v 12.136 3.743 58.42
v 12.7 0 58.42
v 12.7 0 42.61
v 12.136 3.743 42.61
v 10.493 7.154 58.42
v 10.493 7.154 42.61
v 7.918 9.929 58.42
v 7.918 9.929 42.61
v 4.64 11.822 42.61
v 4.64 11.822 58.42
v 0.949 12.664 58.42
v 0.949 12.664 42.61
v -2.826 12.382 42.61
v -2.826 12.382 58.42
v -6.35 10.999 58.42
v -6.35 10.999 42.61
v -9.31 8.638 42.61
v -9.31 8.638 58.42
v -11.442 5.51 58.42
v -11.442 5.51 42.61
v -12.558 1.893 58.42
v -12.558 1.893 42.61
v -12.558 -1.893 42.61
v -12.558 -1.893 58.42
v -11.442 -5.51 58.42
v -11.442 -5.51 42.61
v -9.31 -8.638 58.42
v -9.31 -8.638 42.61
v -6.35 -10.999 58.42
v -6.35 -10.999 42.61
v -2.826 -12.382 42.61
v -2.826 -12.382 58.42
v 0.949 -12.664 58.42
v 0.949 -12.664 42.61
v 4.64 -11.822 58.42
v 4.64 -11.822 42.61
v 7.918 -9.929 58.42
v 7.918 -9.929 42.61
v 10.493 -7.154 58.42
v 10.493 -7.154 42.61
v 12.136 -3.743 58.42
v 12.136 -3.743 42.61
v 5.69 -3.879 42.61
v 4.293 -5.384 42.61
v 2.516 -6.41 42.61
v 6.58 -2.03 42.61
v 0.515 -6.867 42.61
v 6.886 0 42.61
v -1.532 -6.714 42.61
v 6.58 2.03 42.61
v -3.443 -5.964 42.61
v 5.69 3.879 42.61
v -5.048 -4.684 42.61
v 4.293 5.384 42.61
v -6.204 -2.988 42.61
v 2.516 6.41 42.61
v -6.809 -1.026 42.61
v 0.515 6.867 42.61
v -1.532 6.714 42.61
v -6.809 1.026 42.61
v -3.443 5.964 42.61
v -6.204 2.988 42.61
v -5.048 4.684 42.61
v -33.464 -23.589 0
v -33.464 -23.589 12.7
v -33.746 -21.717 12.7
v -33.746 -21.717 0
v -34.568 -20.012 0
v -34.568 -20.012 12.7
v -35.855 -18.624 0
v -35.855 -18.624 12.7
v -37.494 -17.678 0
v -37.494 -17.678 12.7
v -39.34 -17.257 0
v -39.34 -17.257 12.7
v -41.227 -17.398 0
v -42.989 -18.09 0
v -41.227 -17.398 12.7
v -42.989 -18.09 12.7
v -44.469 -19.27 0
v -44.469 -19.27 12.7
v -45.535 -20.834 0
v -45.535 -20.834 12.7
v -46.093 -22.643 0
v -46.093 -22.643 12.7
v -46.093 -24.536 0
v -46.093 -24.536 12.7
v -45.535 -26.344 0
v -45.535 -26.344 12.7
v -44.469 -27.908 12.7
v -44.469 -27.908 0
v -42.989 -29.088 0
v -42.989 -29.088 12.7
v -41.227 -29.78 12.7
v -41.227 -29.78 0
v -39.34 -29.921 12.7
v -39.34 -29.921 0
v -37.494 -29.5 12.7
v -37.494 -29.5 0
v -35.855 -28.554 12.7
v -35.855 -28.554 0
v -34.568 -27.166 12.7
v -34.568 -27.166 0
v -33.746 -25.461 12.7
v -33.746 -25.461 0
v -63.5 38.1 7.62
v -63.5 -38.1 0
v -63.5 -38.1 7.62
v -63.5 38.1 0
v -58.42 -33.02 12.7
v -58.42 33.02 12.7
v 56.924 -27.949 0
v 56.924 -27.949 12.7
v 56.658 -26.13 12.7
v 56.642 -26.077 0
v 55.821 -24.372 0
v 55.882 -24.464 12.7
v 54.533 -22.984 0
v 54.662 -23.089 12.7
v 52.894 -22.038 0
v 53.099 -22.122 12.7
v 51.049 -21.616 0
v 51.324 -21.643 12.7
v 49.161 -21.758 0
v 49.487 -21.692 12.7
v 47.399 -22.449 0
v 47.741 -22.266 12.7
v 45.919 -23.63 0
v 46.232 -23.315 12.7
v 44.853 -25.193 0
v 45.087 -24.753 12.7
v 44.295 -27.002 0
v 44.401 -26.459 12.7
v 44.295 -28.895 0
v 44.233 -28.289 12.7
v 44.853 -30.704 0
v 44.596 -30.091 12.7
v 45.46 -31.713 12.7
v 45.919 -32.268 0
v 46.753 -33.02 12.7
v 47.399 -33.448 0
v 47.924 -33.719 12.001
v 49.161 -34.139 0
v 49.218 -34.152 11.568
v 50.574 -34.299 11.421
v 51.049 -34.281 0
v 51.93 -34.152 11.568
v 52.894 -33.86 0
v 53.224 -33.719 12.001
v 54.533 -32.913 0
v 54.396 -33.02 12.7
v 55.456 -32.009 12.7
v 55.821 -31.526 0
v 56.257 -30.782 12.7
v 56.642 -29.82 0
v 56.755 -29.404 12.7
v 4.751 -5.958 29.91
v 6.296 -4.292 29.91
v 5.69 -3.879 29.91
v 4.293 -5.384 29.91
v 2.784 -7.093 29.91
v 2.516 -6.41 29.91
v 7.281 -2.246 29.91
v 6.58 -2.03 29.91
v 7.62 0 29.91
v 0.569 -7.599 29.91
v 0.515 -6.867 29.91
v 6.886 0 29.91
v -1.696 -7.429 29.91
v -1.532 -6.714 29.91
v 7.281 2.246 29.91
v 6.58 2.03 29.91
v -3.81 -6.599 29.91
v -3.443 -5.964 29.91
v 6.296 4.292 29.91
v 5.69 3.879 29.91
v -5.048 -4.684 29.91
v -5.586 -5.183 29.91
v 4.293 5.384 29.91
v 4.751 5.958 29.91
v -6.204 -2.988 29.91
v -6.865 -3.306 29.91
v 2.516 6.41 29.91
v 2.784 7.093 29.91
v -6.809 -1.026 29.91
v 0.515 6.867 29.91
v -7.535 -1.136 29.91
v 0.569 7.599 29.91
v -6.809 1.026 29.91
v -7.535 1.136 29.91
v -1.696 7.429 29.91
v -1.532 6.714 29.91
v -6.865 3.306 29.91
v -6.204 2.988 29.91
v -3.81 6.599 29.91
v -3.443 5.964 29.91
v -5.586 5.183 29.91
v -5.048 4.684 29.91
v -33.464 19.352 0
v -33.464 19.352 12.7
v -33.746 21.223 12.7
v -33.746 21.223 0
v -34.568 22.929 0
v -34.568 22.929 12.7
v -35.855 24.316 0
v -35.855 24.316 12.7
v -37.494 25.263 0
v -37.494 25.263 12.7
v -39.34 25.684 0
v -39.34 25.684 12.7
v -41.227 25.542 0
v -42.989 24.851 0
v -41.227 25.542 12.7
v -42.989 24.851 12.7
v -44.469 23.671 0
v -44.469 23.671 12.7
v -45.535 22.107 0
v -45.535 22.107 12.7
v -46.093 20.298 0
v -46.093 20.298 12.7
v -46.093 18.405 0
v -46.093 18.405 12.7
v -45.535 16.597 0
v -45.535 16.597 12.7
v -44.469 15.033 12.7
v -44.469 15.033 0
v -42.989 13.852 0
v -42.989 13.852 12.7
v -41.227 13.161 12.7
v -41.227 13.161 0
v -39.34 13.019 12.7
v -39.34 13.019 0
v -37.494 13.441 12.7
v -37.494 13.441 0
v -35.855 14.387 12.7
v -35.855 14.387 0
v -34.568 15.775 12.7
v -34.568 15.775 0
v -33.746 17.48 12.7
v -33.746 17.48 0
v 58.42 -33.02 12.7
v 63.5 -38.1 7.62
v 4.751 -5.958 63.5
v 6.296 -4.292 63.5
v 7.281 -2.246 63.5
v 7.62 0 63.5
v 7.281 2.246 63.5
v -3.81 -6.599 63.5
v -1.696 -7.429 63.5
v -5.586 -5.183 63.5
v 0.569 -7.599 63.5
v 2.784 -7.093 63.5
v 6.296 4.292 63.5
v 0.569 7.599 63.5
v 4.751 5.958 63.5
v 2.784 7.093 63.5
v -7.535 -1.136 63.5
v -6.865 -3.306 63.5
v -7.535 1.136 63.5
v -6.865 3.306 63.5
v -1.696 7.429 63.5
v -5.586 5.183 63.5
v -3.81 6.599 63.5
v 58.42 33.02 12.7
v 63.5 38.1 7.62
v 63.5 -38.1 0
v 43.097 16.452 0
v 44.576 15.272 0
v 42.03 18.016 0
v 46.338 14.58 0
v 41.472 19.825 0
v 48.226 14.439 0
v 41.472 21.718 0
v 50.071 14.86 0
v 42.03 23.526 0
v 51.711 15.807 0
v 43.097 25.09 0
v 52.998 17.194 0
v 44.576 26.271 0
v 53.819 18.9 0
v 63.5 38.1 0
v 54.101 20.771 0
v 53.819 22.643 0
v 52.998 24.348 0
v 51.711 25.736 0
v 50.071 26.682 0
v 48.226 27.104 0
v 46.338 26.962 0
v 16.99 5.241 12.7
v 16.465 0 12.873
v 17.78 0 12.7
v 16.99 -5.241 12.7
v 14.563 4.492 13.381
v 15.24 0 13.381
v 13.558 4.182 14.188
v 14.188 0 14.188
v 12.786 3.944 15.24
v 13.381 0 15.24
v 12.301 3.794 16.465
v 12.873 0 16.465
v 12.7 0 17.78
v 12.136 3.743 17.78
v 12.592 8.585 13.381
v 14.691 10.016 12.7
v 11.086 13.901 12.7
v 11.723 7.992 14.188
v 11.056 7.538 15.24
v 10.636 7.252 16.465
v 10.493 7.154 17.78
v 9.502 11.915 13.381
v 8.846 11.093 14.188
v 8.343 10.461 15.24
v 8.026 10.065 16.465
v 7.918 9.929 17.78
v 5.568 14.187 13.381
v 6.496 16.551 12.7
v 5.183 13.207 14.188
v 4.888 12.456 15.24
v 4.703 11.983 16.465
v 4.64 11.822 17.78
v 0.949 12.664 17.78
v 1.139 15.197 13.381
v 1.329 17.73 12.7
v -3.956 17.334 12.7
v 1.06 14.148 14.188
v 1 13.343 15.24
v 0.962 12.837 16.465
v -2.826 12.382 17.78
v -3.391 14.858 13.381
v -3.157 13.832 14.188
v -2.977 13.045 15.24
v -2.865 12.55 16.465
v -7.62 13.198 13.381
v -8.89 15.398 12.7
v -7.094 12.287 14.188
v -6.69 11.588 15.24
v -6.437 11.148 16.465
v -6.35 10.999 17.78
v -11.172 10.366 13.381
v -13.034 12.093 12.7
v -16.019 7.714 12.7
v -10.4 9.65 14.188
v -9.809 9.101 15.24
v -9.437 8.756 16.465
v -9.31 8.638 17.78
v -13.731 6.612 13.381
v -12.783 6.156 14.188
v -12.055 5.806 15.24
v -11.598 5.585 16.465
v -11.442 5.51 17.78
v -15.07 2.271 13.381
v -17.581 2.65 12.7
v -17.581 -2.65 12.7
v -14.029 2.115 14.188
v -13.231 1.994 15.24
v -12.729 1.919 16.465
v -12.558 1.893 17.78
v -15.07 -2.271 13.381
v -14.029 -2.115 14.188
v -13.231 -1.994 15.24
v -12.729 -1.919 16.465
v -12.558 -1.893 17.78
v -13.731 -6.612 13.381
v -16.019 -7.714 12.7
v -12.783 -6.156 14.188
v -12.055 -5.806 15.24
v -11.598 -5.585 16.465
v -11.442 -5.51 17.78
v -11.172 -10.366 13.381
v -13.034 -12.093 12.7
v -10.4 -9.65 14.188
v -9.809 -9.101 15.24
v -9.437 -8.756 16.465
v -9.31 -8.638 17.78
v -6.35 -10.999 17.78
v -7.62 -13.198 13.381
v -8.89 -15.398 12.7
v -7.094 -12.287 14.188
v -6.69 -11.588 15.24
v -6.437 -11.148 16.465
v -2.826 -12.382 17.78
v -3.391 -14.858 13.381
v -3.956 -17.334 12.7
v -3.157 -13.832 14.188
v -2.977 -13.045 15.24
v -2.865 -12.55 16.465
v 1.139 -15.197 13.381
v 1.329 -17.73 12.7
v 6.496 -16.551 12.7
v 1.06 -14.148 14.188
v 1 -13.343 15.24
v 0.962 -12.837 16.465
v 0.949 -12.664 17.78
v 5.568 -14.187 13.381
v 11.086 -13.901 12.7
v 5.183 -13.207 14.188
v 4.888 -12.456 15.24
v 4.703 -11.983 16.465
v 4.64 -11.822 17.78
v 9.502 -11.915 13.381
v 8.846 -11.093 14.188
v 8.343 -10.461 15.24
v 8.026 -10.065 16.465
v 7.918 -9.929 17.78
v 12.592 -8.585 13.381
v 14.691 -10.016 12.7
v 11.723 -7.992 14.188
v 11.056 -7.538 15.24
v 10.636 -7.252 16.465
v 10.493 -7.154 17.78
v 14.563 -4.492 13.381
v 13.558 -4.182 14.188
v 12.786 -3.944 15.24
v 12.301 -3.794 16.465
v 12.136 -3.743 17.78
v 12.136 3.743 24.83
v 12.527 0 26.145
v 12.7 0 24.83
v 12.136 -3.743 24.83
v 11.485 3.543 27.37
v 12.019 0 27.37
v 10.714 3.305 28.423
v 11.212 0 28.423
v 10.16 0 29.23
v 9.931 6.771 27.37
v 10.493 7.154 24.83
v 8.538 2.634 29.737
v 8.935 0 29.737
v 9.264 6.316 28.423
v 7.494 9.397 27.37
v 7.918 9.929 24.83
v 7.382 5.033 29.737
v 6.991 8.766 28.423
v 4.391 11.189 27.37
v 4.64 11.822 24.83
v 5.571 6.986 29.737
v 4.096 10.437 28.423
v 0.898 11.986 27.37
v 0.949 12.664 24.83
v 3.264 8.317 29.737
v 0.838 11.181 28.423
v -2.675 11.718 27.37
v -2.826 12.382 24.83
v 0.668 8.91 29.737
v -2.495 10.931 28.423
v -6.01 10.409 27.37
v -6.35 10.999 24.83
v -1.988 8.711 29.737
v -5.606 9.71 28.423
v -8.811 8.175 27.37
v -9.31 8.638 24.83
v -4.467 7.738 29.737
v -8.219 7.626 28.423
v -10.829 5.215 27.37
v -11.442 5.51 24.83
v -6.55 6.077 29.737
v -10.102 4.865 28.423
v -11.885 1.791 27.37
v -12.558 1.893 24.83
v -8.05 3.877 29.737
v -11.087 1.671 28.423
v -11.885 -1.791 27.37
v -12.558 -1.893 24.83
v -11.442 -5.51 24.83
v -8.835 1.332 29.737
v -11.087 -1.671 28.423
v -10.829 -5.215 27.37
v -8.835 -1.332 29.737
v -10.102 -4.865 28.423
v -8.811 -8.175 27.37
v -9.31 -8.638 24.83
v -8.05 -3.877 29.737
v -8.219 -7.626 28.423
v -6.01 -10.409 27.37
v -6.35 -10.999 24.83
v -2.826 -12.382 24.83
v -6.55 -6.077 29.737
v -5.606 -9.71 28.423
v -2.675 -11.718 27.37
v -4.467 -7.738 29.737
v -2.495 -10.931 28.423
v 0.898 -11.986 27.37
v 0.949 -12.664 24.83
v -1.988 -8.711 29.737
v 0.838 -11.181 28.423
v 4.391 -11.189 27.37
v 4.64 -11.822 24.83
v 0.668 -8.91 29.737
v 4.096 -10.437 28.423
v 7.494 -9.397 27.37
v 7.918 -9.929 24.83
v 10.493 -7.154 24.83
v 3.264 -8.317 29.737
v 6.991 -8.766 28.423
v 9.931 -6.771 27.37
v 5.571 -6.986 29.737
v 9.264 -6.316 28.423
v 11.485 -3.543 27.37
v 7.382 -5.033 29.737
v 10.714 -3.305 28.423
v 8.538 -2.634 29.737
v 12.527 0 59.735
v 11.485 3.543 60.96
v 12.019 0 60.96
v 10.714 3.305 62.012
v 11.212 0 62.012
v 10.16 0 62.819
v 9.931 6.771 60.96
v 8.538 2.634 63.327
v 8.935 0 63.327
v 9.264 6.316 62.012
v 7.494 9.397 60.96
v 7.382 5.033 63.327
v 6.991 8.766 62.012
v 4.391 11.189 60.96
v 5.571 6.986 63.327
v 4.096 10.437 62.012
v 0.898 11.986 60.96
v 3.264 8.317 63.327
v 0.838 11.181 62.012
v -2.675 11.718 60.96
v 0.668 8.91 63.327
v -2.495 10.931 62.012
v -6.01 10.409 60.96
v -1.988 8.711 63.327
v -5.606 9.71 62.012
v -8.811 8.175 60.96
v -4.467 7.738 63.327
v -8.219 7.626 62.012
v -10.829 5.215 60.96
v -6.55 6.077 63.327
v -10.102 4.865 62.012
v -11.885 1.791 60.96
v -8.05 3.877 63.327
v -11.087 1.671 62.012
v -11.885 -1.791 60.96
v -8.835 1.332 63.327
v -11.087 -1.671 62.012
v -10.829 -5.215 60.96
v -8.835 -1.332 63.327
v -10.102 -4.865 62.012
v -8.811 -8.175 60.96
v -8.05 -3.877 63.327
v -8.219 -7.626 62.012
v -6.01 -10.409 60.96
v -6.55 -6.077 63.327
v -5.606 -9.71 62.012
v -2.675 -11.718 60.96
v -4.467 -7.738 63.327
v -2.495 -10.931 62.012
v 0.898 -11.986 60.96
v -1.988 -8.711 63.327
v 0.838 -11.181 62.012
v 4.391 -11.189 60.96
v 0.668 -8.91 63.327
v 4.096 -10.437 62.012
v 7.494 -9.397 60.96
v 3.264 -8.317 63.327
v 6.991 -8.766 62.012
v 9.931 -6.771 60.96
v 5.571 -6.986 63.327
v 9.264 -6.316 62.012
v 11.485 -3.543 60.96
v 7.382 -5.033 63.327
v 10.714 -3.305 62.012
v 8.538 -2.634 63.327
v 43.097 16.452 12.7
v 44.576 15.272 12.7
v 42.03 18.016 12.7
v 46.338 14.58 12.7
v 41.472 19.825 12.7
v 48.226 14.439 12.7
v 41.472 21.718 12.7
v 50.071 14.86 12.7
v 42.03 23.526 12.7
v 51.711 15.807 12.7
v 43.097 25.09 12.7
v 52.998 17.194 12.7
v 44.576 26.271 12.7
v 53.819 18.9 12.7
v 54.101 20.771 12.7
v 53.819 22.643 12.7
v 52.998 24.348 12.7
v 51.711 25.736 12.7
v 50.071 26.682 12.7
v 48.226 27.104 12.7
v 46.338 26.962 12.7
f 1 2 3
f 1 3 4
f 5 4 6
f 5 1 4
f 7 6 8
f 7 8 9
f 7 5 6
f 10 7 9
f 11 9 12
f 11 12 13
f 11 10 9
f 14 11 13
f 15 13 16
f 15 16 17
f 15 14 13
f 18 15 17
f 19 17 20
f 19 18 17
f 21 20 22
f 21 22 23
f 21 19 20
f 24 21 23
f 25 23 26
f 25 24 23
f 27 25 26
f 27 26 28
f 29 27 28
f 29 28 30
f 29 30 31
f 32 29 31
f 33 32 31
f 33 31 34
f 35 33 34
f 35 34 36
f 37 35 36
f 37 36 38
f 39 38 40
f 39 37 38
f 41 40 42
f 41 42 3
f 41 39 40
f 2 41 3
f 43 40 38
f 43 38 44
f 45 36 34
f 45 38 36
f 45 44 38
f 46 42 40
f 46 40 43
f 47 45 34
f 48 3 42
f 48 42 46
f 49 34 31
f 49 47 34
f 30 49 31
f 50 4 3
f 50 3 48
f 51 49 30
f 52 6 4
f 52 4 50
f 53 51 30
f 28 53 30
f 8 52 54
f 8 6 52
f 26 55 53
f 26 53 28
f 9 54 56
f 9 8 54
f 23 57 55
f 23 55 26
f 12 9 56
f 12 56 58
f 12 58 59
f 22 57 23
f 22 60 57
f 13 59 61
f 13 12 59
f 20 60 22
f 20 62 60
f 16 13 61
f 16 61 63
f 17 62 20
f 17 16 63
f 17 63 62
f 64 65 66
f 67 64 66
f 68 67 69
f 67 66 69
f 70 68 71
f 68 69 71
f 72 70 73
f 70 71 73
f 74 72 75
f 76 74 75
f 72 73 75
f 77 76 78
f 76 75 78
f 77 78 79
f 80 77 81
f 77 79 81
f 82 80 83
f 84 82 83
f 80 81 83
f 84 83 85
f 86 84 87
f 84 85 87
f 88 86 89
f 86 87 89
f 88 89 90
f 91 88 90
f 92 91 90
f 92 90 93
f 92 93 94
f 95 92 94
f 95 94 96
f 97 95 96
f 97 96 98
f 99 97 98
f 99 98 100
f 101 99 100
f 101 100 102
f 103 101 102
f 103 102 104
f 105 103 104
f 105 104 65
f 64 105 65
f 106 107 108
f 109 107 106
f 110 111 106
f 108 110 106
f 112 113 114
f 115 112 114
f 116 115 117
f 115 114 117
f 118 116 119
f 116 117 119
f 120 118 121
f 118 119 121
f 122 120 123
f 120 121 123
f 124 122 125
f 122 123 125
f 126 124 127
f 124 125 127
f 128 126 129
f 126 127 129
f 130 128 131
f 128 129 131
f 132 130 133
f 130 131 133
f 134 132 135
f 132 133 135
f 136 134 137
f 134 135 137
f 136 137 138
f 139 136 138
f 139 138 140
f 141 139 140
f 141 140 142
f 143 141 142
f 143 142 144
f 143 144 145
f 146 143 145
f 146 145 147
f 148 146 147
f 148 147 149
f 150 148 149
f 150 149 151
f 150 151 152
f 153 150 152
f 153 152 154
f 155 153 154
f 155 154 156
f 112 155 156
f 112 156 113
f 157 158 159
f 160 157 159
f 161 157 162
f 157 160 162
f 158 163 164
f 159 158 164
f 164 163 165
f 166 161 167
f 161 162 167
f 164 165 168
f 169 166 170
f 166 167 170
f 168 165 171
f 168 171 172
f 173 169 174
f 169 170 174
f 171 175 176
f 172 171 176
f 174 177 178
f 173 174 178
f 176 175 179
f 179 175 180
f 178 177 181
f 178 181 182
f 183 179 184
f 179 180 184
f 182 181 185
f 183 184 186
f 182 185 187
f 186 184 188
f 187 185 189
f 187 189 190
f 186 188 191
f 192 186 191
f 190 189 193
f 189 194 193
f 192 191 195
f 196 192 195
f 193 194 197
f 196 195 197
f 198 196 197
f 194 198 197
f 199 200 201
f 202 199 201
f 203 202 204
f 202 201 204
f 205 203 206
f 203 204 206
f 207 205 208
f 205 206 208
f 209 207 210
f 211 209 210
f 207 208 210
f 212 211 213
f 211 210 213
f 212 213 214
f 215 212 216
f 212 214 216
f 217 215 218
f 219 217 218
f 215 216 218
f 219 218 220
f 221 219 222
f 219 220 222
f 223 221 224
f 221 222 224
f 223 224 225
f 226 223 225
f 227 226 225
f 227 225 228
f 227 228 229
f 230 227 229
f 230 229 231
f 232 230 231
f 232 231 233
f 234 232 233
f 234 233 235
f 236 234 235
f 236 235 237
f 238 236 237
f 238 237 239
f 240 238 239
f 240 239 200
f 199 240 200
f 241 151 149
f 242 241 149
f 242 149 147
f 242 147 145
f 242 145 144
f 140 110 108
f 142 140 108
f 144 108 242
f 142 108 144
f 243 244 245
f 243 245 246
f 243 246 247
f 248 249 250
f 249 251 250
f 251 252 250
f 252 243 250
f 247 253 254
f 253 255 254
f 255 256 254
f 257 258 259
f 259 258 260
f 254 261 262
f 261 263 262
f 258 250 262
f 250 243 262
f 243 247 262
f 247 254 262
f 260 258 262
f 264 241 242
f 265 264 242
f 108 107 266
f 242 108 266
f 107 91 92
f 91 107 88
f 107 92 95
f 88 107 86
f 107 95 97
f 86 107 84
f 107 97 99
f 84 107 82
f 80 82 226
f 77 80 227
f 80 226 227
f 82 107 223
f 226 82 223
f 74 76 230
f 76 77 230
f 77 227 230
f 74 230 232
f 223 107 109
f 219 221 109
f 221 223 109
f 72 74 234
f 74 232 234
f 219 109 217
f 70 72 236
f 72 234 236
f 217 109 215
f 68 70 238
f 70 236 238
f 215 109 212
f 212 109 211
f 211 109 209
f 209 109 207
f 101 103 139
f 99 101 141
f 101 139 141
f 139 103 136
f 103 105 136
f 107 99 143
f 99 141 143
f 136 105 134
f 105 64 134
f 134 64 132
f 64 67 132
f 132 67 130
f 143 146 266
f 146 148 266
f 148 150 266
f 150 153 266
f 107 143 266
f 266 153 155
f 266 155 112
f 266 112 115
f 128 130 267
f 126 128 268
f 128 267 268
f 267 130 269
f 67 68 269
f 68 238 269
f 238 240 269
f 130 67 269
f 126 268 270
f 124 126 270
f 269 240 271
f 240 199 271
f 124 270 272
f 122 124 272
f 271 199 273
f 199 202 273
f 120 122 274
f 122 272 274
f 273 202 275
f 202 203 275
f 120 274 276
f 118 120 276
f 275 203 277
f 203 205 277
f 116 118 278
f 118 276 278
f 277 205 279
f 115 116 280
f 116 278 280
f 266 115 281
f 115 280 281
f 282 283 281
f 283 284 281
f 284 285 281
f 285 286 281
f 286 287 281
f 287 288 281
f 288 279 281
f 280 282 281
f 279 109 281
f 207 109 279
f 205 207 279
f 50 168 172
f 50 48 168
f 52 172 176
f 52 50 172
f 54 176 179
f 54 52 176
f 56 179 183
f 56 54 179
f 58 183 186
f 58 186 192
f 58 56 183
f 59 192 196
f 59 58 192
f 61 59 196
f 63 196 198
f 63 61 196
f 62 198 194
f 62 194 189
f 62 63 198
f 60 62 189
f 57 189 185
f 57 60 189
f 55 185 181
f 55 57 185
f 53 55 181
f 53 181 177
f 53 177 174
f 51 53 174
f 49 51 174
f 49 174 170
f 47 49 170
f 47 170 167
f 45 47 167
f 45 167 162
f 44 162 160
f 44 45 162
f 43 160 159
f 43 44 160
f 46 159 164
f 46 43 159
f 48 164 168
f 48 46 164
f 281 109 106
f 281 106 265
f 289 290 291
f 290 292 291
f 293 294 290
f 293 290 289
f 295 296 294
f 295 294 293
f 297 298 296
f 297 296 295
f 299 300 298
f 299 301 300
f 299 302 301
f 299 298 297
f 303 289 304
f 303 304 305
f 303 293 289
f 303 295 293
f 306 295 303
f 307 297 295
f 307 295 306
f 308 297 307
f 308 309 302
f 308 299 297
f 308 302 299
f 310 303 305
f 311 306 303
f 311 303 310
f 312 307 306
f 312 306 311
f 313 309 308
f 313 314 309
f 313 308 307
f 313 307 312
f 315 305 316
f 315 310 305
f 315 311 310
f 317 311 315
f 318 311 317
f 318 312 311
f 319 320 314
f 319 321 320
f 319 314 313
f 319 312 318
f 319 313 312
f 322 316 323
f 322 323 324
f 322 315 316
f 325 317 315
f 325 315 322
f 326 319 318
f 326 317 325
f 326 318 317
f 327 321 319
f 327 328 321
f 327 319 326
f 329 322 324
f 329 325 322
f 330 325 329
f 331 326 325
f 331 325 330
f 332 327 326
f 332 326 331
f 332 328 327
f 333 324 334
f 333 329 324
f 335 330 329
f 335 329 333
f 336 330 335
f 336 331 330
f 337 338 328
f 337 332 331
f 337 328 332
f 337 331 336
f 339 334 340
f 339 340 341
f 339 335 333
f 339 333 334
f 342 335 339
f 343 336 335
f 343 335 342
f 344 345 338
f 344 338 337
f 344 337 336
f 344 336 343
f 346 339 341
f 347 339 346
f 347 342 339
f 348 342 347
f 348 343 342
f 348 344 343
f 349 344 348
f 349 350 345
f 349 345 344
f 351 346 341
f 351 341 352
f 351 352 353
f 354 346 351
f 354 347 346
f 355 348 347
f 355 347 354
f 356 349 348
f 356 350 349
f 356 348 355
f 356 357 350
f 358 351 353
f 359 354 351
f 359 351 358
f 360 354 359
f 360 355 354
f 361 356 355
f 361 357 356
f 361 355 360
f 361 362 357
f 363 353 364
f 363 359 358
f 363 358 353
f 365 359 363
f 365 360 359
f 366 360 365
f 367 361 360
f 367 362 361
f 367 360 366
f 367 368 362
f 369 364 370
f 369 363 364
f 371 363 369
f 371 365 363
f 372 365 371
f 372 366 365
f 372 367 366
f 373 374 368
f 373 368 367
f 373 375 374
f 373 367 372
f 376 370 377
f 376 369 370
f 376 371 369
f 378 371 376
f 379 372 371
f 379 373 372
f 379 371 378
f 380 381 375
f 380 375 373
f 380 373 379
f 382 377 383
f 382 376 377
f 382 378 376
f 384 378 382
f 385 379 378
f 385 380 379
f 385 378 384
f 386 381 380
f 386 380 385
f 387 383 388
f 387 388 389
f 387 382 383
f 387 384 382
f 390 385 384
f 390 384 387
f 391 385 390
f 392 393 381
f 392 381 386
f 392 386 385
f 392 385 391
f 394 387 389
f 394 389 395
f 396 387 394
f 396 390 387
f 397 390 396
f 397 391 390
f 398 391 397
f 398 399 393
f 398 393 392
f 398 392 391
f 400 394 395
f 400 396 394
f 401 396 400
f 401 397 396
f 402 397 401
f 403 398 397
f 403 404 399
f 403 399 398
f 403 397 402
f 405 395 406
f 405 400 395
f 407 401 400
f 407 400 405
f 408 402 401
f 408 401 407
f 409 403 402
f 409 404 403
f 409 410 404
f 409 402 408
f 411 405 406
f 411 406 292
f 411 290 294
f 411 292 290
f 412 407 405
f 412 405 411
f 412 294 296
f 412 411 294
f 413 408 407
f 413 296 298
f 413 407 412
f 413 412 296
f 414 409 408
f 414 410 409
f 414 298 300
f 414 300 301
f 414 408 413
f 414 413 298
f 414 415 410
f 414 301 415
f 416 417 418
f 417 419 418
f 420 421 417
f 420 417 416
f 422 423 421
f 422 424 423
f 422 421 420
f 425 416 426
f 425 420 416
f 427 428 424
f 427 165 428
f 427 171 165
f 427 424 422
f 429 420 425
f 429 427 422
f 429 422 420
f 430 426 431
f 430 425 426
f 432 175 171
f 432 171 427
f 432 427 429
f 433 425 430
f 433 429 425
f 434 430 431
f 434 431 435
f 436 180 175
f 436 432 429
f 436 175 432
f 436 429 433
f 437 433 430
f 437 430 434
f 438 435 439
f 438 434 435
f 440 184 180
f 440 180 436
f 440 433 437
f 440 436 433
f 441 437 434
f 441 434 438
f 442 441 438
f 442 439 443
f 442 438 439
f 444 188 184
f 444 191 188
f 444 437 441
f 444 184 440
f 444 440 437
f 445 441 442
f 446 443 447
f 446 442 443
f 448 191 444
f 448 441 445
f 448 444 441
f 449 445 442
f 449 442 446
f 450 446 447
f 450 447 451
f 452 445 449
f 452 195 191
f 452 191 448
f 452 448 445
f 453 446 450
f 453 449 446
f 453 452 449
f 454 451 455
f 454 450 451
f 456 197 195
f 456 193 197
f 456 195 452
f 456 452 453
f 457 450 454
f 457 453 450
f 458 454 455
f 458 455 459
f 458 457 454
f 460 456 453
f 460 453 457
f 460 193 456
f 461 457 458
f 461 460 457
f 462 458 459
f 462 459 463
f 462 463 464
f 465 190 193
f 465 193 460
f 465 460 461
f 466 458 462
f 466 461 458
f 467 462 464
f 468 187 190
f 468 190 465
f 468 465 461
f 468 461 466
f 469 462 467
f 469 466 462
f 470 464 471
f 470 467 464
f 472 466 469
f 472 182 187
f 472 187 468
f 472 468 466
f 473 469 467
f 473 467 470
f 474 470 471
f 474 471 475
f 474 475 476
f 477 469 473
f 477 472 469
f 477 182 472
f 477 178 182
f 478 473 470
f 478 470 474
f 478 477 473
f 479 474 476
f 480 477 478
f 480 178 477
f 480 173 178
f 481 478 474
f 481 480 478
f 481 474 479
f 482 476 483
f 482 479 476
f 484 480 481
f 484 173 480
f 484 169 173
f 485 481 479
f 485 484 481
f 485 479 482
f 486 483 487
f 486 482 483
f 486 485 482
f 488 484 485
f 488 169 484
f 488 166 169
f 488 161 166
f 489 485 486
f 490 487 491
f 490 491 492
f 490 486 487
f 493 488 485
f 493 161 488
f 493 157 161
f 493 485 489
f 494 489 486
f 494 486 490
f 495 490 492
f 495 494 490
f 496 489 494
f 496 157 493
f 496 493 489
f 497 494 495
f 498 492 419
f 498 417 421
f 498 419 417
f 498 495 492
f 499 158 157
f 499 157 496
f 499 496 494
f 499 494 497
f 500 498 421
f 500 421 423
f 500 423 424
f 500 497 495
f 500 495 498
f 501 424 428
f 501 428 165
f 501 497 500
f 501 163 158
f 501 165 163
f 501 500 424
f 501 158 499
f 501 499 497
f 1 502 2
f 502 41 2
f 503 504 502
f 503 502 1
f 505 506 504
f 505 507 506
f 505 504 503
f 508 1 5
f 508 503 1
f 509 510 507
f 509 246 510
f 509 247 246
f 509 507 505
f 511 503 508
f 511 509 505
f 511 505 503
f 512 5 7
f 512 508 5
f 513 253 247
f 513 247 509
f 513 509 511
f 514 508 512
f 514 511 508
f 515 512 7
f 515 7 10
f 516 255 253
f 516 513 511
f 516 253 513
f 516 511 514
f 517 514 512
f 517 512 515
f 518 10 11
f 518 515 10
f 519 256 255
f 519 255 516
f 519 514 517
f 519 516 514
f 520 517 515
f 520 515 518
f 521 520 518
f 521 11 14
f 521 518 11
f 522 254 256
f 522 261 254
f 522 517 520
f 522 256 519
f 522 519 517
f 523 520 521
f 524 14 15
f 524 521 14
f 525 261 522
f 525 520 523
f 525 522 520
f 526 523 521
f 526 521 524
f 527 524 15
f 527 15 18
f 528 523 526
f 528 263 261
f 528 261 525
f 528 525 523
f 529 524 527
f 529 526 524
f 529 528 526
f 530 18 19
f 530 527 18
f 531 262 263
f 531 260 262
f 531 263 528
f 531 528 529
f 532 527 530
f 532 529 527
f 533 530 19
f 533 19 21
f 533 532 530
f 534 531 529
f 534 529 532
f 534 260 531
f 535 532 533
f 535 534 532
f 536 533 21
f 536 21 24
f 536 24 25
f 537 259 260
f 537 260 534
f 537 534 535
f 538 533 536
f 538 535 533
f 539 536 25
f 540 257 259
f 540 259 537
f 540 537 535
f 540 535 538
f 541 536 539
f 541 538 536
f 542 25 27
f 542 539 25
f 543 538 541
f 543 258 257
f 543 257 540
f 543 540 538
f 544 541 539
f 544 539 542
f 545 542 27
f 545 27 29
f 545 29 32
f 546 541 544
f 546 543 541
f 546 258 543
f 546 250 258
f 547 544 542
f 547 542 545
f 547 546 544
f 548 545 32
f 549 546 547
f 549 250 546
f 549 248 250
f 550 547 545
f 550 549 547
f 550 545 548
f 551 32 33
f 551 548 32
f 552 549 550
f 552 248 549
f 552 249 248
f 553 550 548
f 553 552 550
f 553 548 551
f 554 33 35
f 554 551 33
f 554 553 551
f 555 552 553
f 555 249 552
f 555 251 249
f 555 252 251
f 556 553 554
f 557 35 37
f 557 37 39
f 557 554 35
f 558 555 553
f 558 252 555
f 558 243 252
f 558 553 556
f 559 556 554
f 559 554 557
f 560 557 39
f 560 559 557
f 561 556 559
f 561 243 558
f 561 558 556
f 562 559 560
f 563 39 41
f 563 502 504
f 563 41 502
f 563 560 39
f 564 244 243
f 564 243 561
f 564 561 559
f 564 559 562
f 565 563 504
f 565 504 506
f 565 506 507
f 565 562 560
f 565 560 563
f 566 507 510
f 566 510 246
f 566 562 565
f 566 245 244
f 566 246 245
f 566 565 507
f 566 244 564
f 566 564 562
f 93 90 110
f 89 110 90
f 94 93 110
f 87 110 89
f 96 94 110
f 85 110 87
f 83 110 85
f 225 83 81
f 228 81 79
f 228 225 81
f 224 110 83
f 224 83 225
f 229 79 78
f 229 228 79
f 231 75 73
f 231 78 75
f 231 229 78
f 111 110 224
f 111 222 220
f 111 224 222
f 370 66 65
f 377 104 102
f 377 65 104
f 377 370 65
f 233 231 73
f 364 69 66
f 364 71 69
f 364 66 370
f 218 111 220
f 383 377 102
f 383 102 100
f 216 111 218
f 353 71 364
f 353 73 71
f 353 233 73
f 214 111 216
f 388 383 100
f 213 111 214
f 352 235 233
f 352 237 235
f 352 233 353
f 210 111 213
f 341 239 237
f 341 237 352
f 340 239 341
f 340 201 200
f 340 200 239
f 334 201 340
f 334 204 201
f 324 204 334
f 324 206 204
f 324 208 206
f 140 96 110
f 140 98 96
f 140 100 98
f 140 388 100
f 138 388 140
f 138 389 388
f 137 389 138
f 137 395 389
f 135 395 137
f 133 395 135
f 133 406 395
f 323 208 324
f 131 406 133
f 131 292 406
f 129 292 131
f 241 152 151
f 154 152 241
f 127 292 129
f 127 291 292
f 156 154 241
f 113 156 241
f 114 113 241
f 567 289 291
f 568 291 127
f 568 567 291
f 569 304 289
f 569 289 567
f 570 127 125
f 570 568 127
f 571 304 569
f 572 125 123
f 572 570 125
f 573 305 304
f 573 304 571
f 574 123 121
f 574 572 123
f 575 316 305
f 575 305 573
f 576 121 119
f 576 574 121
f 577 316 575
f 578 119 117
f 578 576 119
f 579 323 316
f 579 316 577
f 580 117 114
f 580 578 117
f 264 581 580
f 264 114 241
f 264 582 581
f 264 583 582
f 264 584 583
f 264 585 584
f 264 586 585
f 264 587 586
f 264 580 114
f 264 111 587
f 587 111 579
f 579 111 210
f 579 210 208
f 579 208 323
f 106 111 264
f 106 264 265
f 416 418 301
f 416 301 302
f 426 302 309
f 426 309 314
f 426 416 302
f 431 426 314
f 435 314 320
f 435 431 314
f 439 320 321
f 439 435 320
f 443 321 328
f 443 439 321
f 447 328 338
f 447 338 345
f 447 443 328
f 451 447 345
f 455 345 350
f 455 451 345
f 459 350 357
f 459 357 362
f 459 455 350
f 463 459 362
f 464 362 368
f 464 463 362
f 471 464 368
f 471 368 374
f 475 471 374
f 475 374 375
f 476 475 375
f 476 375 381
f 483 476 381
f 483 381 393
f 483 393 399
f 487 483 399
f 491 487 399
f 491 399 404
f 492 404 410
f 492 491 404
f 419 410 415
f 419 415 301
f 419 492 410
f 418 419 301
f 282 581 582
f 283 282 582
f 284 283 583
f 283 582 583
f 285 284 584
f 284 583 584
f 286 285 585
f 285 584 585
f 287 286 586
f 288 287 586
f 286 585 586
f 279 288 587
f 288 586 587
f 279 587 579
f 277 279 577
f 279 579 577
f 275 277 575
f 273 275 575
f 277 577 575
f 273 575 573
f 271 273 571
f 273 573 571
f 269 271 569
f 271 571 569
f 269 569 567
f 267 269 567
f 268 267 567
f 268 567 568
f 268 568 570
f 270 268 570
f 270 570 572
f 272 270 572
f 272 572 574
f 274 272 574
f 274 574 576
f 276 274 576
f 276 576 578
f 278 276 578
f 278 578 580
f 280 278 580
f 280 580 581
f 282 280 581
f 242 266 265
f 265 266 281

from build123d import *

# Parameters (mm, degrees)
F0_W        = 127
F0_H        = 76.2
F1_DEPTH    = 12.7
F2_R        = 6.35
F3_DEPTH    = 12.701
F4_W        = 12.7
F4_H        = 50.8
F6_W        = 7.62
F6_H        = 12.7
F8_R        = 5.08
F9_T1_DEPTH = 153.1282991577
F9_T3_DEPTH = 102.3282991577


# Not quite as in the source:
# - a fillet or chamfer that OpenCascade refuses, or shapes differently, is made with other operations: its cross-section is extruded or revolved along the edge and cut away or added


with BuildPart() as f1:
    # F0 (on Top) → F1 (new body)
    with BuildSketch(Plane.XY):
        Rectangle(F0_W, F0_H)
    extrude(amount=F1_DEPTH)

    # F2 (on face) → F3 (cut, through all)
    with BuildSketch(Plane.XY.offset(12.7)):
        with Locations((-39.8141870437, -23.5891287784)):
            Circle(F2_R)
        with Locations((47.751432499, 20.7712577737)):
            Circle(F2_R)
        with Locations((-39.8141870437, 19.3517001108)):
            Circle(F2_R)
        with Locations((50.5741164088, -27.9485974461)):
            Circle(F2_R)
    extrude(amount=-F3_DEPTH, mode=Mode.SUBTRACT)

    # F4 (on Front) → F5 (revolve)
    with BuildSketch(Plane.XZ):
        with Locations((6.35, 38.1)):
            Rectangle(F4_W, F4_H)
    revolve(axis=Axis((0, 0, 38.1), (0, 0, 1)))

    # F6 (on Front) → F7 (revolve, cut)
    with BuildSketch(Plane.XZ):
        with Locations((10.6961938009, 36.2604726106)):
            Rectangle(F6_W, F6_H)
    revolve(axis=Axis((0, 0, 12.7), (0, 0, 1)), mode=Mode.SUBTRACT)

    # F8
    f8_edges = [f1.edges().sort_by_distance(p)[0] for p in [
        (-12.7, 0, 29.910473),
        (-12.7, 0, 63.5),
        (-12.7, 0, 12.7),
    ]]
    fillet(f8_edges, radius=F8_R)

    # F9: chamfer of 5.08 on 7 edges, made by hand

    # F9_s2 → F9_t1 (cut)
    with BuildSketch(Plane.YZ.offset(-76.5641495789)):
        Polygon((33.02, 12.7), (38.1, 7.62), (38.1, 12.7), align=None)
        Polygon((-33.02, 12.7), (-38.1, 7.62), (-38.1, 12.7), align=None)
    extrude(amount=F9_T1_DEPTH, mode=Mode.SUBTRACT)

    # F9_s4 → F9_t3 (cut)
    with BuildSketch(Plane.XZ.offset(-51.1641495789)):
        Polygon((58.42, 12.7), (63.5, 7.62), (63.5, 12.7), align=None)
        Polygon((-58.42, 12.7), (-63.5, 7.62), (-63.5, 12.7), align=None)
    extrude(amount=F9_T3_DEPTH, mode=Mode.SUBTRACT)


solid = f1.part
